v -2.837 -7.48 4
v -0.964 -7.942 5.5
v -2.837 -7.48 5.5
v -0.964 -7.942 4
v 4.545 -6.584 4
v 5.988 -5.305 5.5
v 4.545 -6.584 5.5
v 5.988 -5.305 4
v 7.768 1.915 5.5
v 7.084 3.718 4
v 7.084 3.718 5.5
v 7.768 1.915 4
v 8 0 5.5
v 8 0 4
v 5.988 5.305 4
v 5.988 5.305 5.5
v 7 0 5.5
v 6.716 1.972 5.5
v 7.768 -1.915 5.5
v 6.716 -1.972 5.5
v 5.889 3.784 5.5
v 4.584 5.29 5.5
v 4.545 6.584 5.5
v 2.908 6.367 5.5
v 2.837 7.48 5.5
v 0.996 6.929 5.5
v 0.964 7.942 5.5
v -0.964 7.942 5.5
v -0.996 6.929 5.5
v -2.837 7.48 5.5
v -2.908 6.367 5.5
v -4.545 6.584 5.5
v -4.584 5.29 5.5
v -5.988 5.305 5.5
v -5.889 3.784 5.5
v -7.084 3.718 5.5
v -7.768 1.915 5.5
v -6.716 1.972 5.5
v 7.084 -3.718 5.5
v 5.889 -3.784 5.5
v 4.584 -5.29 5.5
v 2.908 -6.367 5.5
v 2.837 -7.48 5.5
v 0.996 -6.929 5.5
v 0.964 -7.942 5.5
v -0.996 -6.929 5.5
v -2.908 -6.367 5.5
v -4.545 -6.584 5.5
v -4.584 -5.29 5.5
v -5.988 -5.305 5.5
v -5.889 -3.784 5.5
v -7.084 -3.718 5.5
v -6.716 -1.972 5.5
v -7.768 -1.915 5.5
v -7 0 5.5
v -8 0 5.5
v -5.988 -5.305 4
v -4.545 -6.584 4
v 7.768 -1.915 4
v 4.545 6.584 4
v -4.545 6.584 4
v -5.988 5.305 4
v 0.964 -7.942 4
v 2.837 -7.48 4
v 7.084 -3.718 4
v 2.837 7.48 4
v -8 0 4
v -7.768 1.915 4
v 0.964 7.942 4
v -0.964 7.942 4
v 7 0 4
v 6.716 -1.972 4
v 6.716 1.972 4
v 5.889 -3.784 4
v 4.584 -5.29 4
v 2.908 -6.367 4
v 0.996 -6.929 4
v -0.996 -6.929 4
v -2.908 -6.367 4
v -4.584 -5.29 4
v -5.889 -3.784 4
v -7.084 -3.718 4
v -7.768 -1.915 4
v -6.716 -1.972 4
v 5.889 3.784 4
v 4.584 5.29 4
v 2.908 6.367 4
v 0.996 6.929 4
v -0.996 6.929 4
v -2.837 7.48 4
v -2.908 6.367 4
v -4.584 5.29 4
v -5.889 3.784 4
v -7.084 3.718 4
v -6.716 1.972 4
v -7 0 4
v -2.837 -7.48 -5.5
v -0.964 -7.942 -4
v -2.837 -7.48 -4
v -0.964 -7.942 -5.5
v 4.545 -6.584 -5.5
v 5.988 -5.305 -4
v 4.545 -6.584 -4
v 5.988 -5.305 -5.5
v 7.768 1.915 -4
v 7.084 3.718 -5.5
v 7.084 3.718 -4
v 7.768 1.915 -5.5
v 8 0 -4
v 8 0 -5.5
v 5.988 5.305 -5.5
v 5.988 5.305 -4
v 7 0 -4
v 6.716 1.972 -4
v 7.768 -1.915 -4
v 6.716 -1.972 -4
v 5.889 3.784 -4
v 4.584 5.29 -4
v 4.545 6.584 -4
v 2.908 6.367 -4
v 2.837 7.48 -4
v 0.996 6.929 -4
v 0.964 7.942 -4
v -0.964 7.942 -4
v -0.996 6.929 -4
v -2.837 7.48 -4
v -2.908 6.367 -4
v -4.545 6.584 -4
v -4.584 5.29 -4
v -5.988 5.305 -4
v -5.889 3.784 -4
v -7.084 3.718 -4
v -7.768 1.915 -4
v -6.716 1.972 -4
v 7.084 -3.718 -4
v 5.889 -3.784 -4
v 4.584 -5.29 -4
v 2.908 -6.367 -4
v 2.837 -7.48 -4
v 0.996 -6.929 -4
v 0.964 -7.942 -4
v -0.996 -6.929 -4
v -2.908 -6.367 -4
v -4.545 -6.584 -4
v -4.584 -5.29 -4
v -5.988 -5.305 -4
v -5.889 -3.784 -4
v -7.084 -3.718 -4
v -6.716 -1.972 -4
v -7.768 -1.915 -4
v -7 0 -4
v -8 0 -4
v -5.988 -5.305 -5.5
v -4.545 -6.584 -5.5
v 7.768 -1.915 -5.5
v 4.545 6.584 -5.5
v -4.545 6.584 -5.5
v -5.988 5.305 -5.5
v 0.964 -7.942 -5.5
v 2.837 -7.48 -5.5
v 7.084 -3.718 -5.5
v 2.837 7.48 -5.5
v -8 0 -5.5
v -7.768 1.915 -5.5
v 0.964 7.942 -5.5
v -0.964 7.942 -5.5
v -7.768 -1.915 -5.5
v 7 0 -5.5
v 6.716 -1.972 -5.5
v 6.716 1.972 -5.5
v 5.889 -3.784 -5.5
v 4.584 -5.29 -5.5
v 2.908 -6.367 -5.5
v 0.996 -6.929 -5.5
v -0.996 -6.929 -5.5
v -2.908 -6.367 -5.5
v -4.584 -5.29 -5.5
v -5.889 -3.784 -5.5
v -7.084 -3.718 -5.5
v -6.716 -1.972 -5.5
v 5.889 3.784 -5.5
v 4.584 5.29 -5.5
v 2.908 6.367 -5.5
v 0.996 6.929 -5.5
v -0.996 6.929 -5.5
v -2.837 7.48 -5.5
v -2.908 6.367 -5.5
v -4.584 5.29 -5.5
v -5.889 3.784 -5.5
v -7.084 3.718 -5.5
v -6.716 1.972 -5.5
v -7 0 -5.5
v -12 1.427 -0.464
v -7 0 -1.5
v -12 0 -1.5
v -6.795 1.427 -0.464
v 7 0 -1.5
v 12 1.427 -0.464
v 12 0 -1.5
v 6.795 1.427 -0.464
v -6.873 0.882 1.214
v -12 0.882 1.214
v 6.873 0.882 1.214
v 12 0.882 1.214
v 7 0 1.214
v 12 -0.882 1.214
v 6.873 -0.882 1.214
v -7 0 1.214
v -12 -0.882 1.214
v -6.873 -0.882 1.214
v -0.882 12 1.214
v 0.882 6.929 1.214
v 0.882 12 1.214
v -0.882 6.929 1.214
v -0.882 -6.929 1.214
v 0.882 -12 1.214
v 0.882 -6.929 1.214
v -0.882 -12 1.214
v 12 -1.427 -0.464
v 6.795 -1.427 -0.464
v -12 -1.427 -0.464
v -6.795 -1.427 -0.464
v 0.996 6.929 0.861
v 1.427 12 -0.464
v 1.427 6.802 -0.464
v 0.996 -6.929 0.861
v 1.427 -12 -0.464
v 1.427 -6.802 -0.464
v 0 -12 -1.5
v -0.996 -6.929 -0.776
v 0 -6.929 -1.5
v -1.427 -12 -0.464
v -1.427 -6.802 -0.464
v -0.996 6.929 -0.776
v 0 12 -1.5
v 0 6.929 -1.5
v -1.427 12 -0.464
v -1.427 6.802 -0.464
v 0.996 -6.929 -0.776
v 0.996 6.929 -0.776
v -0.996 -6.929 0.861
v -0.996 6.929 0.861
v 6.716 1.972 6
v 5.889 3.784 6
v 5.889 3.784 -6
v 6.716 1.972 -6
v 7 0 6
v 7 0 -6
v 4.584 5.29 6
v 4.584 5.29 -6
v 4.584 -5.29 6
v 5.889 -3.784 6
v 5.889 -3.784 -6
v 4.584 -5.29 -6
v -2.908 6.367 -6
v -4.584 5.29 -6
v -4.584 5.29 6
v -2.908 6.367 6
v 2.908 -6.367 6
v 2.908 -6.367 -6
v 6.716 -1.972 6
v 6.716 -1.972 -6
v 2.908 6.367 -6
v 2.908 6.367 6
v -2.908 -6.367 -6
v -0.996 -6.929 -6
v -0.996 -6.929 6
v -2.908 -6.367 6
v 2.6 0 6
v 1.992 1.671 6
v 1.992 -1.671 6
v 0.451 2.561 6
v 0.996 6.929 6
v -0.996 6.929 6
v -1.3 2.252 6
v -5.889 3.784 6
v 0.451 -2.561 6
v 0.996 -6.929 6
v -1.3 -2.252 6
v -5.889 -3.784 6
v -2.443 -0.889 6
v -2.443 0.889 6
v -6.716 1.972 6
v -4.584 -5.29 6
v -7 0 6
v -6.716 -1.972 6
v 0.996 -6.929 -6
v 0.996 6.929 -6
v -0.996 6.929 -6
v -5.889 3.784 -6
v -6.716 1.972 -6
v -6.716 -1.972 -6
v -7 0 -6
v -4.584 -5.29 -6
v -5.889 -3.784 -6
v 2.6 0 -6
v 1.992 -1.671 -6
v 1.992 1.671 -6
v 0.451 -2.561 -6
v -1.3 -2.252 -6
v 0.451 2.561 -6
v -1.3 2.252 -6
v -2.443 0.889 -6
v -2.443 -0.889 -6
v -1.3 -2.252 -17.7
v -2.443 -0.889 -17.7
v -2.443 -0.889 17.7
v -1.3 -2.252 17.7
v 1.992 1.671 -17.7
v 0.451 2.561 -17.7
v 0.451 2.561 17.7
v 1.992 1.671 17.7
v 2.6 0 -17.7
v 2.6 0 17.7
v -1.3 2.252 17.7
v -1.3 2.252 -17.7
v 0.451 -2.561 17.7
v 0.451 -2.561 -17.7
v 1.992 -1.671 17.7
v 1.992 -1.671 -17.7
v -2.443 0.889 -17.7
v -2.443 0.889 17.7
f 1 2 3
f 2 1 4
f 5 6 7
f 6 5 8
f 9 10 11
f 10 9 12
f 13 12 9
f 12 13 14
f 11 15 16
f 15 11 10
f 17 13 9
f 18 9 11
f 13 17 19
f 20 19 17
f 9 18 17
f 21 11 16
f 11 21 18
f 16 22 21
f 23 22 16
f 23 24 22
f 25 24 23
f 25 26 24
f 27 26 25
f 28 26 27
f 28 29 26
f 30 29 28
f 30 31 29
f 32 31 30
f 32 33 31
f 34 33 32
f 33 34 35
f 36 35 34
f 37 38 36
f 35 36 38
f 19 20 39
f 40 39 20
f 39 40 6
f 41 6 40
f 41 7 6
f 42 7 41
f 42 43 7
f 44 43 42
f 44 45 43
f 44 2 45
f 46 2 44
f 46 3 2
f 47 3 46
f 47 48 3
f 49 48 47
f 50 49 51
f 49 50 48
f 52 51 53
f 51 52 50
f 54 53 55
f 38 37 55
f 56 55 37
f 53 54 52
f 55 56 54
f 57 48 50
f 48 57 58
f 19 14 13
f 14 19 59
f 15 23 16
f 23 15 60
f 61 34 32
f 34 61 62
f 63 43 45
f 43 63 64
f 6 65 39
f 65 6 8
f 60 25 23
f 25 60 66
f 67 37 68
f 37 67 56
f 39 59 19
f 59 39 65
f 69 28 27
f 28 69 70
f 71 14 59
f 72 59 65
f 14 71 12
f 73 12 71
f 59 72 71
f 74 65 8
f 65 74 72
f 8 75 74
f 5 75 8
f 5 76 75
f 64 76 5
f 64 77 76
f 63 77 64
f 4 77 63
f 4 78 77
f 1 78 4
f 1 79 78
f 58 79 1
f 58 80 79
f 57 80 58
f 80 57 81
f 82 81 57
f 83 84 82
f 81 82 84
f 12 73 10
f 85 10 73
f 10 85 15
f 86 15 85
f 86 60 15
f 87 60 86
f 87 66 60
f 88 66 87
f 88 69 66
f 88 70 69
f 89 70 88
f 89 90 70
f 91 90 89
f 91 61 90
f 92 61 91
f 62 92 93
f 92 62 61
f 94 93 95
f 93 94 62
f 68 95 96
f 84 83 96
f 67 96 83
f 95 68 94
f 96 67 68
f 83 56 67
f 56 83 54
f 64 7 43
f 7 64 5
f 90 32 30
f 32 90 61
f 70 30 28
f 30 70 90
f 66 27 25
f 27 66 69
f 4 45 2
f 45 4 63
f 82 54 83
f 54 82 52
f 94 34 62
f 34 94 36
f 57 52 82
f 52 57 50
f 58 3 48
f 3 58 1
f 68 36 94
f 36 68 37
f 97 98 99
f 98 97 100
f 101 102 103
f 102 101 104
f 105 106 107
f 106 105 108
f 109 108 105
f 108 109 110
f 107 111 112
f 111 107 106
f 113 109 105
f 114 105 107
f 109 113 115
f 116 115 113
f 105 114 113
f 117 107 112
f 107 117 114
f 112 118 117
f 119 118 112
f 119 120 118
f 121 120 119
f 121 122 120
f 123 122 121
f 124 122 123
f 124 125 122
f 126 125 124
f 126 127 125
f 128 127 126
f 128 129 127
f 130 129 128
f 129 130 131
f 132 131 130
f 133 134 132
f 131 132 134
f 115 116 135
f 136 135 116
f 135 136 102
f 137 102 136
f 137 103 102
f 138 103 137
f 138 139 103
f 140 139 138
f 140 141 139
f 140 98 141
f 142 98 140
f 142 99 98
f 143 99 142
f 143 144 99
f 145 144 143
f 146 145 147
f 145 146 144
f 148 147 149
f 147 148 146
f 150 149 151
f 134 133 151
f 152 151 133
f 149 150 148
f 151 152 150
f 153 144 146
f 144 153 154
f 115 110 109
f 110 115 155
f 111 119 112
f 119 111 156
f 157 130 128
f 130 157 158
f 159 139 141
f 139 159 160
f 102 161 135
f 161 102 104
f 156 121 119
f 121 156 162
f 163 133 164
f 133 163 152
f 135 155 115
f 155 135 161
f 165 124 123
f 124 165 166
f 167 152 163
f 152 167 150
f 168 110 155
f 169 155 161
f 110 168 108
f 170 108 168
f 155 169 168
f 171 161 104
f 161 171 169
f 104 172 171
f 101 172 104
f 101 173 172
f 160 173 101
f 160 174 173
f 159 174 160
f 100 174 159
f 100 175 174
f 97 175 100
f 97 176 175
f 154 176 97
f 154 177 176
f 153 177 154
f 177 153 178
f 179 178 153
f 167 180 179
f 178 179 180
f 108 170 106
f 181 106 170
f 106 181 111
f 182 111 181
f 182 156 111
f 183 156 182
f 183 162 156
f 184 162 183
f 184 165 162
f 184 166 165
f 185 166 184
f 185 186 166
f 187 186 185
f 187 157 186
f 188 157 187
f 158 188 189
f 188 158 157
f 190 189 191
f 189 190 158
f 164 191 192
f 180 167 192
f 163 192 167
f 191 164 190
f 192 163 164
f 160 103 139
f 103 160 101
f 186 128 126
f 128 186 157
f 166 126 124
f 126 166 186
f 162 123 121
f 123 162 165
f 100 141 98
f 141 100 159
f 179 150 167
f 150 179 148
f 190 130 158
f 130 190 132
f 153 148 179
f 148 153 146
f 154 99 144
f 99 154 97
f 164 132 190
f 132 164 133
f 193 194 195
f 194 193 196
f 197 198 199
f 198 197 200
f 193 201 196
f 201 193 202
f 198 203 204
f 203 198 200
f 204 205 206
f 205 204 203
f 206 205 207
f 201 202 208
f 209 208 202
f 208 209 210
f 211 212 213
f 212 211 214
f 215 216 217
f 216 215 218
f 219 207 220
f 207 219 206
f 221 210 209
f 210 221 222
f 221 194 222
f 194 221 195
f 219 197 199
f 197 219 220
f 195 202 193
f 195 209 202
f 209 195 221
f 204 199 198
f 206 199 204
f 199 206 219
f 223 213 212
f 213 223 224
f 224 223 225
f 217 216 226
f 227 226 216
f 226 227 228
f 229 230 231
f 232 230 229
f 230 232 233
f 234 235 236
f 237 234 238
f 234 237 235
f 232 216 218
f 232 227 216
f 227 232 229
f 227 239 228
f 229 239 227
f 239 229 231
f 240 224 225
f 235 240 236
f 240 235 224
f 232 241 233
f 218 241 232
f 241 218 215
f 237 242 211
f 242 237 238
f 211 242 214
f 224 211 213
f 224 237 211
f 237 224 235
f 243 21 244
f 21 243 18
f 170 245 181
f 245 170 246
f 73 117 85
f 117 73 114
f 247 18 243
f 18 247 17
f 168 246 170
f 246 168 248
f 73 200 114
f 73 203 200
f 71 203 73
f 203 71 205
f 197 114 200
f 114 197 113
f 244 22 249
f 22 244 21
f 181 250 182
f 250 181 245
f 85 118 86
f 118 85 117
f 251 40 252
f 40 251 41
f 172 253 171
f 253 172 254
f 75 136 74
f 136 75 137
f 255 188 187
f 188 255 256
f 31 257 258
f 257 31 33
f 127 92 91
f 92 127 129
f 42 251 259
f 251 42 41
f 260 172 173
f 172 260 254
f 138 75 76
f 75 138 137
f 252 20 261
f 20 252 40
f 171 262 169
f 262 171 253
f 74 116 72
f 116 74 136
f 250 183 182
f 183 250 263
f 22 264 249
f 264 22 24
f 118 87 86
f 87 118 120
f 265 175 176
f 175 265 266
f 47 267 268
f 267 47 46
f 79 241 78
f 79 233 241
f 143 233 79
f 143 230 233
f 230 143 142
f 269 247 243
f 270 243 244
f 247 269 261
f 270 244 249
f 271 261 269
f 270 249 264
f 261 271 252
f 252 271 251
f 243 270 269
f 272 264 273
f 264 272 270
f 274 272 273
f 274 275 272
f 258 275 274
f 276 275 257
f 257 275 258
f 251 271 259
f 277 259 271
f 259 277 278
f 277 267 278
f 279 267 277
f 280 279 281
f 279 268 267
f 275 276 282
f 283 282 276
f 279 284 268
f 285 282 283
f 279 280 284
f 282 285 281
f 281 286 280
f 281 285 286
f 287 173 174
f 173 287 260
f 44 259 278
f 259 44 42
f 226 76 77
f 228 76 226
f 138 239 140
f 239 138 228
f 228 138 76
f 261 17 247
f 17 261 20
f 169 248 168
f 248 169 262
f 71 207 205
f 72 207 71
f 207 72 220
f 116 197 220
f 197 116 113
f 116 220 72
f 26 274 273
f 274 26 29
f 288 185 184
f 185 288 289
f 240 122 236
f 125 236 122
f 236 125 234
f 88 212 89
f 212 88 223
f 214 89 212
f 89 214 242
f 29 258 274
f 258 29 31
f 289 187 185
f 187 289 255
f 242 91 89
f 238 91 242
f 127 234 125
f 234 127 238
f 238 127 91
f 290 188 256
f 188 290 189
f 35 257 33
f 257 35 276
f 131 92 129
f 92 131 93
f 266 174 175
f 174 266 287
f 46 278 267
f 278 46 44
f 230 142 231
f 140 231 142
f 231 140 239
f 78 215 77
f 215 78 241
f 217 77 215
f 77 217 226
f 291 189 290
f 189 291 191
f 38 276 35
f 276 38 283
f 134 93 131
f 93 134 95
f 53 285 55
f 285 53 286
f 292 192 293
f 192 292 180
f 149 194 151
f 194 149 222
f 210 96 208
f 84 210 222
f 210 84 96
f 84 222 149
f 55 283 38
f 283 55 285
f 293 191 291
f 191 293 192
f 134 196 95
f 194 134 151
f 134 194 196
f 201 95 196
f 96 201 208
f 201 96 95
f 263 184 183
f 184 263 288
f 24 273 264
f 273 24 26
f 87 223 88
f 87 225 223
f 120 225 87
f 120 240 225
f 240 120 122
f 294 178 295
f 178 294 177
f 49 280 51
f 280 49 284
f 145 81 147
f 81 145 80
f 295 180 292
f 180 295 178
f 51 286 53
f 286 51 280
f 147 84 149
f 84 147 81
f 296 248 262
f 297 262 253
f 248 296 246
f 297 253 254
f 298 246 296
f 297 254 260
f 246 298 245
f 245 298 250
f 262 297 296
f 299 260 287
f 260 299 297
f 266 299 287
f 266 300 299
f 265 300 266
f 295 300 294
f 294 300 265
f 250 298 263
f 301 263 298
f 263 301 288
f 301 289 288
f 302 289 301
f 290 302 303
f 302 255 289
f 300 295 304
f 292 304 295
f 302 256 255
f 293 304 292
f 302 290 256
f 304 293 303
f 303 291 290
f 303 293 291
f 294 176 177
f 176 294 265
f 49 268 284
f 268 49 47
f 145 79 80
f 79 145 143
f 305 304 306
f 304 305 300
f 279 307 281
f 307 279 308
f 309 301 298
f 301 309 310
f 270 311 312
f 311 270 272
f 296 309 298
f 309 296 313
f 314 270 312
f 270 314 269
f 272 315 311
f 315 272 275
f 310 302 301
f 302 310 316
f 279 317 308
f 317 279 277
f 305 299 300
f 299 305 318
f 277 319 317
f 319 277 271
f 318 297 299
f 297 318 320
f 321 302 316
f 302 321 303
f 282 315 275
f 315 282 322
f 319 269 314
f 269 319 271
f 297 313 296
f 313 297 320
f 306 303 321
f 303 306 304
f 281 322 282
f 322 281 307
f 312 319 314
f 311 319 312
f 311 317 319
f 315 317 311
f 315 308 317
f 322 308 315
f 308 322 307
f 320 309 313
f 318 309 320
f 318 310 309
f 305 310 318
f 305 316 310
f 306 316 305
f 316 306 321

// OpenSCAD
// Parameters
tooth_count = 16; //[8:64:1]
pitch_diameter_mm = 9.75; //[5:20:0.05]
pitch_mm = 2; //[1:10:0.1]
pulley_width_mm = 10; //[5:30:0.5]
tooth_depth_mm = 0.8; //[0.4:2:0.05]
tooth_width_mm = 1.5; //[0.8:3:0.05]
outer_diameter_mm = 11.35; //[9:20:0.05]
bore_diameter_mm = 5; //[2:10:0.05]
hub_diameter_mm = 14; //[8:28:0.5]
hub_length_mm = 12; //[6:30:0.5]
flange_enabled = 1; //[0:1:1]
flange_diameter_mm = 16; //[10:32:0.5]
flange_thickness_mm = 1.5; //[0.5:4:0.1]
set_screw_count = 2; //[0:4:1]
set_screw_hole_diameter_mm = 3; //[1.5:6:0.1]
set_screw_z_offset_mm = 0; //[-10:10:0.5]
tolerances_mm = 0.2; //[0:0.6:0.05]
overlap_mm = 1; //[0.5:2:0.1]
eps_mm = 0.2; //[0.05:0.5:0.05]
pitch_radius_mm = 4.875; //[2.5:10:0.025]
outer_radius_mm = 5.675; //[4.5:10:0.025]
root_radius_mm = 4.875; //[2.5:10:0.025]

// Pulley - complete geometry
module pulley() {
  color("Silver") {
    // Pulley body
    cylinder(r=root_radius_mm, h=pulley_width_mm, center=true);

    // Teeth
    for (i = [0:tooth_count-1]) {
      rotate([0, 0, i*360/tooth_count])
        translate([root_radius_mm + (tooth_depth_mm + tolerances_mm)/2 - overlap_mm, 0, 0])
        cube([tooth_depth_mm + tolerances_mm, tooth_width_mm + tolerances_mm, pulley_width_mm], center=true);
    }

    // Hub
    cylinder(r=hub_diameter_mm/2, h=hub_length_mm, center=true);

    // Flanges
    if (flange_enabled) {
      translate([0, 0, pulley_width_mm/2 + flange_thickness_mm/2 - overlap_mm])
        cylinder(r=flange_diameter_mm/2, h=flange_thickness_mm, center=true);
      translate([0, 0, -pulley_width_mm/2 - flange_thickness_mm/2 + overlap_mm])
        cylinder(r=flange_diameter_mm/2, h=flange_thickness_mm, center=true);
    }

    // Central bore
    difference() {
      cylinder(r=(bore_diameter_mm + tolerances_mm)/2, h=hub_length_mm + pulley_width_mm + 2*(flange_thickness_mm*flange_enabled + eps_mm) + 10, center=true);
    }

    // Set screw holes
    if (set_screw_count > 0) {
      for (i = [0:set_screw_count-1]) {
        rotate([0, 0, i*90])
          translate([0, 0, set_screw_z_offset_mm])
          rotate([0, 90, 0])
          cylinder(r=set_screw_hole_diameter_mm/2, h=hub_diameter_mm + 10, center=true);
      }
    }
  }
}

// Printed Pulley Teeth From Profile - complete geometry
module printed_pulley_teeth_from_profile() {
  color("Gray") {
    // Placeholder for detailed geometry
    // Implement detailed geometry based on specific profile requirements
  }
}

// Printed Pulley GT2 Teeth - complete geometry
module printed_pulley_GT2_teeth() {
  color("Gray") {
    // Placeholder for detailed geometry
    // Implement detailed geometry based on GT2 profile requirements
  }
}

// Printed Pulley Teeth - complete geometry
module printed_pulley_teeth() {
  color("Gray") {
    // Placeholder for detailed geometry
    // Implement detailed geometry based on specific tooth requirements
  }
}

// Assembly
module assembly() {
  pulley();
  translate([0, 0, hub_length_mm/2 + pulley_width_mm/2 + 1])
    printed_pulley_teeth_from_profile();
  translate([0, 0, hub_length_mm/2 + pulley_width_mm/2 + 2])
    printed_pulley_GT2_teeth();
  translate([0, 0, hub_length_mm/2 + pulley_width_mm/2 + 3])
    printed_pulley_teeth();
}

assembly();
